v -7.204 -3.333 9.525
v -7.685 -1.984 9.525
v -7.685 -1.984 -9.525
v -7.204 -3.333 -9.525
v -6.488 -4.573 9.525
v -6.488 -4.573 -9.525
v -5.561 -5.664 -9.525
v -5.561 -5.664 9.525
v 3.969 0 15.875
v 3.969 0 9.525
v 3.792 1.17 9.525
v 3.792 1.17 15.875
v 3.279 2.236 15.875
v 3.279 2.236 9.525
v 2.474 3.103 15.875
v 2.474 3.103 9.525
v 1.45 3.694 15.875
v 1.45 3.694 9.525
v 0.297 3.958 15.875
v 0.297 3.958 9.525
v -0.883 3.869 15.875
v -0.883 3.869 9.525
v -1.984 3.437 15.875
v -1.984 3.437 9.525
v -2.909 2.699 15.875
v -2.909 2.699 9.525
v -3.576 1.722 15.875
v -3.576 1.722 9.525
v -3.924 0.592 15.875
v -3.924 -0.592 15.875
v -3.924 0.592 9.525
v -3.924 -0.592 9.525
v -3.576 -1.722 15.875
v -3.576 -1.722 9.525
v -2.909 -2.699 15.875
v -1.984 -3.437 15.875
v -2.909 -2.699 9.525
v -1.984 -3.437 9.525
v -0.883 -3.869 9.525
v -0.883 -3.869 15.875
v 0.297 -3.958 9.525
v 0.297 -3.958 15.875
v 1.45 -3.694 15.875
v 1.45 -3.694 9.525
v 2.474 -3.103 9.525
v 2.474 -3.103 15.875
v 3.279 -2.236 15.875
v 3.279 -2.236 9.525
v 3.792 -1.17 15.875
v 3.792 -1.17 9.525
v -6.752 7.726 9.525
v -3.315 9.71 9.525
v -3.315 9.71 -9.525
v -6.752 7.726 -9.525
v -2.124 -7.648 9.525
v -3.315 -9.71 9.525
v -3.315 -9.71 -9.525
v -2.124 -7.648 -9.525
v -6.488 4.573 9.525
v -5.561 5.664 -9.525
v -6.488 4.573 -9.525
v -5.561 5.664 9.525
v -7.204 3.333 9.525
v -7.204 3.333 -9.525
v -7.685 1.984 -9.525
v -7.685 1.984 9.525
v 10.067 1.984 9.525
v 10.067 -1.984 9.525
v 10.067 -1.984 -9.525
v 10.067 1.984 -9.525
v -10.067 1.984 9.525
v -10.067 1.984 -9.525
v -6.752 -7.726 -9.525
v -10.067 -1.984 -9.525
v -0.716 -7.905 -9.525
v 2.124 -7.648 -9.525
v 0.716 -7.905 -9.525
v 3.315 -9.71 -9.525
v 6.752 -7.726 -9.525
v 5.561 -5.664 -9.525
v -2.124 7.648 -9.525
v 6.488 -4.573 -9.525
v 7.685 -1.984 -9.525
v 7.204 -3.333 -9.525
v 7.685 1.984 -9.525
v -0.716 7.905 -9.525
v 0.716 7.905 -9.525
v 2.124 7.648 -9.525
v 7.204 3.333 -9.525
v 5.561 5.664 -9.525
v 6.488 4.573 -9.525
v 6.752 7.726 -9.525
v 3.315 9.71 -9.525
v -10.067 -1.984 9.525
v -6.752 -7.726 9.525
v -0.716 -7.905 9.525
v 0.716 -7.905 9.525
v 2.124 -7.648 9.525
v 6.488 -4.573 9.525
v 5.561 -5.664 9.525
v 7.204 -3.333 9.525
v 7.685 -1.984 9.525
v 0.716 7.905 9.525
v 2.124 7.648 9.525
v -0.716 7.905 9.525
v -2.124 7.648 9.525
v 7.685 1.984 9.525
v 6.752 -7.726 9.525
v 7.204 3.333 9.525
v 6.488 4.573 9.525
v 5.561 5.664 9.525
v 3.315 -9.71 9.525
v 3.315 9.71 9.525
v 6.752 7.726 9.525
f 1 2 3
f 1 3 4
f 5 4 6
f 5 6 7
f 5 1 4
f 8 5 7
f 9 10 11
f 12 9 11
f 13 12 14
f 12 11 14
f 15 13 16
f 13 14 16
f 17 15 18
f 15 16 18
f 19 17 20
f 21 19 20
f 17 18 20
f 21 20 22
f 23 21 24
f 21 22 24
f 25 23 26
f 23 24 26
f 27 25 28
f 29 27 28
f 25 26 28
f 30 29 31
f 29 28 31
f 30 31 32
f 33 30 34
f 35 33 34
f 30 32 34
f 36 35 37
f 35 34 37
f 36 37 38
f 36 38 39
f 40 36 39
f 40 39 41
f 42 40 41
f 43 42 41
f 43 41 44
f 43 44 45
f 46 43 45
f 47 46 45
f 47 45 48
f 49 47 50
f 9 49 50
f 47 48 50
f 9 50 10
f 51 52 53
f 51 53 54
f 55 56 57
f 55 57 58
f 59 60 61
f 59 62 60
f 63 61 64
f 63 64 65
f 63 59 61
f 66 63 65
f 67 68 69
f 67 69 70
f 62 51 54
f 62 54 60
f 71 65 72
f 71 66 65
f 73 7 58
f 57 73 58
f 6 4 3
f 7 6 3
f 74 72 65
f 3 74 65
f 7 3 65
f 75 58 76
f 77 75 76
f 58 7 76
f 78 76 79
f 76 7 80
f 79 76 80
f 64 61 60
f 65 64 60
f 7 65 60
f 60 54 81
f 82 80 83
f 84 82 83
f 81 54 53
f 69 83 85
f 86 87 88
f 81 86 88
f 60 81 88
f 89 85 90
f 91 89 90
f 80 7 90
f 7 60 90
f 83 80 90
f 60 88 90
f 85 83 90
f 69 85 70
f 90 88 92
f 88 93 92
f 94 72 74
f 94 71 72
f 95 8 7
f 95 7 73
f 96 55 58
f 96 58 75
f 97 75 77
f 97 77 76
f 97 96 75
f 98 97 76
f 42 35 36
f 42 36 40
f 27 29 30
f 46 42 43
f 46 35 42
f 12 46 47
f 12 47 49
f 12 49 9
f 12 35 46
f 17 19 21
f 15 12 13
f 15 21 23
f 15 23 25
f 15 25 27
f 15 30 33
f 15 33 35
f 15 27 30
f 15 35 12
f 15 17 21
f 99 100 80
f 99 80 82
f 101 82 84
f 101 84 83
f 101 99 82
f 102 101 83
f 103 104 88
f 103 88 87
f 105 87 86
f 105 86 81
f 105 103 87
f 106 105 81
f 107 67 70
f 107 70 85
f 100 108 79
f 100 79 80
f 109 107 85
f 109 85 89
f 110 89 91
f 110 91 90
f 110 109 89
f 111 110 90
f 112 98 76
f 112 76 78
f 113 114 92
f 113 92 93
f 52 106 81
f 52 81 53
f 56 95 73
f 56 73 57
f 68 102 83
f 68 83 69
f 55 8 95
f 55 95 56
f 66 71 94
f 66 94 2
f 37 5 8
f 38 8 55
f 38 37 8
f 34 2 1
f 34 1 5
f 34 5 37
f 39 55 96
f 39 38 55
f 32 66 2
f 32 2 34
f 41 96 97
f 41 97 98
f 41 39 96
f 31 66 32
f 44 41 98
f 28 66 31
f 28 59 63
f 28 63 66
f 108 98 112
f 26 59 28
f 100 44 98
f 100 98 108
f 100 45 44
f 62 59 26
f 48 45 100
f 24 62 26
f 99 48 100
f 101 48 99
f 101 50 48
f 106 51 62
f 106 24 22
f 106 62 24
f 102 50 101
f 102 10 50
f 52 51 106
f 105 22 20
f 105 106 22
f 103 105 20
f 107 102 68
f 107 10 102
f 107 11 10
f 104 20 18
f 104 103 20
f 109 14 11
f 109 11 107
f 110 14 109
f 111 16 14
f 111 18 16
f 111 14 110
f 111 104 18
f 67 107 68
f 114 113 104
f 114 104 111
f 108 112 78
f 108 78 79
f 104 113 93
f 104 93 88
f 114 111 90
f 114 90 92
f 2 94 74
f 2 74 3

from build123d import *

# Parameters (mm, degrees)
BOSS_EXTRUDE1_DEPTH = 9.525
SKETCH2_R           = 3.96875
BOSS_EXTRUDE2_DEPTH = 6.35


with BuildPart() as part:
    # Sketch1 → Boss-Extrude1 (new, symmetric)
    with BuildSketch(Plane.XY):
        with BuildLine():
            Line((-10.066701328, 1.984375), (-10.066701328, -1.984375))
            Line((-10.066701328, -1.984375), (-7.685451328, -1.984375))
            ThreePointArc((-7.685451328, -1.984375), (-6.874076643, -3.96875), (-5.561244824, -5.663608589))
            Line((-5.561244824, -5.663608589), (-6.751869824, -7.725831582))
            Line((-6.751869824, -7.725831582), (-3.314831503, -9.710206582))
            Line((-3.314831503, -9.710206582), (-2.124206503, -7.647983589))
            ThreePointArc((-2.124206503, -7.647983589), (0, -7.9375), (2.124206503, -7.647983589))
            Line((2.124206503, -7.647983589), (3.314831503, -9.710206582))
            Line((3.314831503, -9.710206582), (6.751869824, -7.725831582))
            Line((6.751869824, -7.725831582), (5.561244824, -5.663608589))
            ThreePointArc((5.561244824, -5.663608589), (6.874076643, -3.96875), (7.685451328, -1.984375))
            Line((7.685451328, -1.984375), (10.066701328, -1.984375))
            Line((10.066701328, -1.984375), (10.066701328, 1.984375))
            Line((10.066701328, 1.984375), (7.685451328, 1.984375))
            ThreePointArc((7.685451328, 1.984375), (6.874076643, 3.96875), (5.561244824, 5.663608589))
            Line((5.561244824, 5.663608589), (6.751869824, 7.725831582))
            Line((6.751869824, 7.725831582), (3.314831503, 9.710206582))
            Line((3.314831503, 9.710206582), (2.124206503, 7.647983589))
            ThreePointArc((2.124206503, 7.647983589), (0, 7.9375), (-2.124206503, 7.647983589))
            Line((-2.124206503, 7.647983589), (-3.314831503, 9.710206582))
            Line((-3.314831503, 9.710206582), (-6.751869824, 7.725831582))
            Line((-6.751869824, 7.725831582), (-5.561244824, 5.663608589))
            ThreePointArc((-5.561244824, 5.663608589), (-6.874076643, 3.96875), (-7.685451328, 1.984375))
            Line((-7.685451328, 1.984375), (-10.066701328, 1.984375))
        make_face()
    extrude(amount=BOSS_EXTRUDE1_DEPTH, both=True)

    # Sketch2 → Boss-Extrude2 (add)
    with BuildSketch(Plane.XY.offset(9.525)):
        Circle(SKETCH2_R)
    extrude(amount=BOSS_EXTRUDE2_DEPTH)


solid = part.part
